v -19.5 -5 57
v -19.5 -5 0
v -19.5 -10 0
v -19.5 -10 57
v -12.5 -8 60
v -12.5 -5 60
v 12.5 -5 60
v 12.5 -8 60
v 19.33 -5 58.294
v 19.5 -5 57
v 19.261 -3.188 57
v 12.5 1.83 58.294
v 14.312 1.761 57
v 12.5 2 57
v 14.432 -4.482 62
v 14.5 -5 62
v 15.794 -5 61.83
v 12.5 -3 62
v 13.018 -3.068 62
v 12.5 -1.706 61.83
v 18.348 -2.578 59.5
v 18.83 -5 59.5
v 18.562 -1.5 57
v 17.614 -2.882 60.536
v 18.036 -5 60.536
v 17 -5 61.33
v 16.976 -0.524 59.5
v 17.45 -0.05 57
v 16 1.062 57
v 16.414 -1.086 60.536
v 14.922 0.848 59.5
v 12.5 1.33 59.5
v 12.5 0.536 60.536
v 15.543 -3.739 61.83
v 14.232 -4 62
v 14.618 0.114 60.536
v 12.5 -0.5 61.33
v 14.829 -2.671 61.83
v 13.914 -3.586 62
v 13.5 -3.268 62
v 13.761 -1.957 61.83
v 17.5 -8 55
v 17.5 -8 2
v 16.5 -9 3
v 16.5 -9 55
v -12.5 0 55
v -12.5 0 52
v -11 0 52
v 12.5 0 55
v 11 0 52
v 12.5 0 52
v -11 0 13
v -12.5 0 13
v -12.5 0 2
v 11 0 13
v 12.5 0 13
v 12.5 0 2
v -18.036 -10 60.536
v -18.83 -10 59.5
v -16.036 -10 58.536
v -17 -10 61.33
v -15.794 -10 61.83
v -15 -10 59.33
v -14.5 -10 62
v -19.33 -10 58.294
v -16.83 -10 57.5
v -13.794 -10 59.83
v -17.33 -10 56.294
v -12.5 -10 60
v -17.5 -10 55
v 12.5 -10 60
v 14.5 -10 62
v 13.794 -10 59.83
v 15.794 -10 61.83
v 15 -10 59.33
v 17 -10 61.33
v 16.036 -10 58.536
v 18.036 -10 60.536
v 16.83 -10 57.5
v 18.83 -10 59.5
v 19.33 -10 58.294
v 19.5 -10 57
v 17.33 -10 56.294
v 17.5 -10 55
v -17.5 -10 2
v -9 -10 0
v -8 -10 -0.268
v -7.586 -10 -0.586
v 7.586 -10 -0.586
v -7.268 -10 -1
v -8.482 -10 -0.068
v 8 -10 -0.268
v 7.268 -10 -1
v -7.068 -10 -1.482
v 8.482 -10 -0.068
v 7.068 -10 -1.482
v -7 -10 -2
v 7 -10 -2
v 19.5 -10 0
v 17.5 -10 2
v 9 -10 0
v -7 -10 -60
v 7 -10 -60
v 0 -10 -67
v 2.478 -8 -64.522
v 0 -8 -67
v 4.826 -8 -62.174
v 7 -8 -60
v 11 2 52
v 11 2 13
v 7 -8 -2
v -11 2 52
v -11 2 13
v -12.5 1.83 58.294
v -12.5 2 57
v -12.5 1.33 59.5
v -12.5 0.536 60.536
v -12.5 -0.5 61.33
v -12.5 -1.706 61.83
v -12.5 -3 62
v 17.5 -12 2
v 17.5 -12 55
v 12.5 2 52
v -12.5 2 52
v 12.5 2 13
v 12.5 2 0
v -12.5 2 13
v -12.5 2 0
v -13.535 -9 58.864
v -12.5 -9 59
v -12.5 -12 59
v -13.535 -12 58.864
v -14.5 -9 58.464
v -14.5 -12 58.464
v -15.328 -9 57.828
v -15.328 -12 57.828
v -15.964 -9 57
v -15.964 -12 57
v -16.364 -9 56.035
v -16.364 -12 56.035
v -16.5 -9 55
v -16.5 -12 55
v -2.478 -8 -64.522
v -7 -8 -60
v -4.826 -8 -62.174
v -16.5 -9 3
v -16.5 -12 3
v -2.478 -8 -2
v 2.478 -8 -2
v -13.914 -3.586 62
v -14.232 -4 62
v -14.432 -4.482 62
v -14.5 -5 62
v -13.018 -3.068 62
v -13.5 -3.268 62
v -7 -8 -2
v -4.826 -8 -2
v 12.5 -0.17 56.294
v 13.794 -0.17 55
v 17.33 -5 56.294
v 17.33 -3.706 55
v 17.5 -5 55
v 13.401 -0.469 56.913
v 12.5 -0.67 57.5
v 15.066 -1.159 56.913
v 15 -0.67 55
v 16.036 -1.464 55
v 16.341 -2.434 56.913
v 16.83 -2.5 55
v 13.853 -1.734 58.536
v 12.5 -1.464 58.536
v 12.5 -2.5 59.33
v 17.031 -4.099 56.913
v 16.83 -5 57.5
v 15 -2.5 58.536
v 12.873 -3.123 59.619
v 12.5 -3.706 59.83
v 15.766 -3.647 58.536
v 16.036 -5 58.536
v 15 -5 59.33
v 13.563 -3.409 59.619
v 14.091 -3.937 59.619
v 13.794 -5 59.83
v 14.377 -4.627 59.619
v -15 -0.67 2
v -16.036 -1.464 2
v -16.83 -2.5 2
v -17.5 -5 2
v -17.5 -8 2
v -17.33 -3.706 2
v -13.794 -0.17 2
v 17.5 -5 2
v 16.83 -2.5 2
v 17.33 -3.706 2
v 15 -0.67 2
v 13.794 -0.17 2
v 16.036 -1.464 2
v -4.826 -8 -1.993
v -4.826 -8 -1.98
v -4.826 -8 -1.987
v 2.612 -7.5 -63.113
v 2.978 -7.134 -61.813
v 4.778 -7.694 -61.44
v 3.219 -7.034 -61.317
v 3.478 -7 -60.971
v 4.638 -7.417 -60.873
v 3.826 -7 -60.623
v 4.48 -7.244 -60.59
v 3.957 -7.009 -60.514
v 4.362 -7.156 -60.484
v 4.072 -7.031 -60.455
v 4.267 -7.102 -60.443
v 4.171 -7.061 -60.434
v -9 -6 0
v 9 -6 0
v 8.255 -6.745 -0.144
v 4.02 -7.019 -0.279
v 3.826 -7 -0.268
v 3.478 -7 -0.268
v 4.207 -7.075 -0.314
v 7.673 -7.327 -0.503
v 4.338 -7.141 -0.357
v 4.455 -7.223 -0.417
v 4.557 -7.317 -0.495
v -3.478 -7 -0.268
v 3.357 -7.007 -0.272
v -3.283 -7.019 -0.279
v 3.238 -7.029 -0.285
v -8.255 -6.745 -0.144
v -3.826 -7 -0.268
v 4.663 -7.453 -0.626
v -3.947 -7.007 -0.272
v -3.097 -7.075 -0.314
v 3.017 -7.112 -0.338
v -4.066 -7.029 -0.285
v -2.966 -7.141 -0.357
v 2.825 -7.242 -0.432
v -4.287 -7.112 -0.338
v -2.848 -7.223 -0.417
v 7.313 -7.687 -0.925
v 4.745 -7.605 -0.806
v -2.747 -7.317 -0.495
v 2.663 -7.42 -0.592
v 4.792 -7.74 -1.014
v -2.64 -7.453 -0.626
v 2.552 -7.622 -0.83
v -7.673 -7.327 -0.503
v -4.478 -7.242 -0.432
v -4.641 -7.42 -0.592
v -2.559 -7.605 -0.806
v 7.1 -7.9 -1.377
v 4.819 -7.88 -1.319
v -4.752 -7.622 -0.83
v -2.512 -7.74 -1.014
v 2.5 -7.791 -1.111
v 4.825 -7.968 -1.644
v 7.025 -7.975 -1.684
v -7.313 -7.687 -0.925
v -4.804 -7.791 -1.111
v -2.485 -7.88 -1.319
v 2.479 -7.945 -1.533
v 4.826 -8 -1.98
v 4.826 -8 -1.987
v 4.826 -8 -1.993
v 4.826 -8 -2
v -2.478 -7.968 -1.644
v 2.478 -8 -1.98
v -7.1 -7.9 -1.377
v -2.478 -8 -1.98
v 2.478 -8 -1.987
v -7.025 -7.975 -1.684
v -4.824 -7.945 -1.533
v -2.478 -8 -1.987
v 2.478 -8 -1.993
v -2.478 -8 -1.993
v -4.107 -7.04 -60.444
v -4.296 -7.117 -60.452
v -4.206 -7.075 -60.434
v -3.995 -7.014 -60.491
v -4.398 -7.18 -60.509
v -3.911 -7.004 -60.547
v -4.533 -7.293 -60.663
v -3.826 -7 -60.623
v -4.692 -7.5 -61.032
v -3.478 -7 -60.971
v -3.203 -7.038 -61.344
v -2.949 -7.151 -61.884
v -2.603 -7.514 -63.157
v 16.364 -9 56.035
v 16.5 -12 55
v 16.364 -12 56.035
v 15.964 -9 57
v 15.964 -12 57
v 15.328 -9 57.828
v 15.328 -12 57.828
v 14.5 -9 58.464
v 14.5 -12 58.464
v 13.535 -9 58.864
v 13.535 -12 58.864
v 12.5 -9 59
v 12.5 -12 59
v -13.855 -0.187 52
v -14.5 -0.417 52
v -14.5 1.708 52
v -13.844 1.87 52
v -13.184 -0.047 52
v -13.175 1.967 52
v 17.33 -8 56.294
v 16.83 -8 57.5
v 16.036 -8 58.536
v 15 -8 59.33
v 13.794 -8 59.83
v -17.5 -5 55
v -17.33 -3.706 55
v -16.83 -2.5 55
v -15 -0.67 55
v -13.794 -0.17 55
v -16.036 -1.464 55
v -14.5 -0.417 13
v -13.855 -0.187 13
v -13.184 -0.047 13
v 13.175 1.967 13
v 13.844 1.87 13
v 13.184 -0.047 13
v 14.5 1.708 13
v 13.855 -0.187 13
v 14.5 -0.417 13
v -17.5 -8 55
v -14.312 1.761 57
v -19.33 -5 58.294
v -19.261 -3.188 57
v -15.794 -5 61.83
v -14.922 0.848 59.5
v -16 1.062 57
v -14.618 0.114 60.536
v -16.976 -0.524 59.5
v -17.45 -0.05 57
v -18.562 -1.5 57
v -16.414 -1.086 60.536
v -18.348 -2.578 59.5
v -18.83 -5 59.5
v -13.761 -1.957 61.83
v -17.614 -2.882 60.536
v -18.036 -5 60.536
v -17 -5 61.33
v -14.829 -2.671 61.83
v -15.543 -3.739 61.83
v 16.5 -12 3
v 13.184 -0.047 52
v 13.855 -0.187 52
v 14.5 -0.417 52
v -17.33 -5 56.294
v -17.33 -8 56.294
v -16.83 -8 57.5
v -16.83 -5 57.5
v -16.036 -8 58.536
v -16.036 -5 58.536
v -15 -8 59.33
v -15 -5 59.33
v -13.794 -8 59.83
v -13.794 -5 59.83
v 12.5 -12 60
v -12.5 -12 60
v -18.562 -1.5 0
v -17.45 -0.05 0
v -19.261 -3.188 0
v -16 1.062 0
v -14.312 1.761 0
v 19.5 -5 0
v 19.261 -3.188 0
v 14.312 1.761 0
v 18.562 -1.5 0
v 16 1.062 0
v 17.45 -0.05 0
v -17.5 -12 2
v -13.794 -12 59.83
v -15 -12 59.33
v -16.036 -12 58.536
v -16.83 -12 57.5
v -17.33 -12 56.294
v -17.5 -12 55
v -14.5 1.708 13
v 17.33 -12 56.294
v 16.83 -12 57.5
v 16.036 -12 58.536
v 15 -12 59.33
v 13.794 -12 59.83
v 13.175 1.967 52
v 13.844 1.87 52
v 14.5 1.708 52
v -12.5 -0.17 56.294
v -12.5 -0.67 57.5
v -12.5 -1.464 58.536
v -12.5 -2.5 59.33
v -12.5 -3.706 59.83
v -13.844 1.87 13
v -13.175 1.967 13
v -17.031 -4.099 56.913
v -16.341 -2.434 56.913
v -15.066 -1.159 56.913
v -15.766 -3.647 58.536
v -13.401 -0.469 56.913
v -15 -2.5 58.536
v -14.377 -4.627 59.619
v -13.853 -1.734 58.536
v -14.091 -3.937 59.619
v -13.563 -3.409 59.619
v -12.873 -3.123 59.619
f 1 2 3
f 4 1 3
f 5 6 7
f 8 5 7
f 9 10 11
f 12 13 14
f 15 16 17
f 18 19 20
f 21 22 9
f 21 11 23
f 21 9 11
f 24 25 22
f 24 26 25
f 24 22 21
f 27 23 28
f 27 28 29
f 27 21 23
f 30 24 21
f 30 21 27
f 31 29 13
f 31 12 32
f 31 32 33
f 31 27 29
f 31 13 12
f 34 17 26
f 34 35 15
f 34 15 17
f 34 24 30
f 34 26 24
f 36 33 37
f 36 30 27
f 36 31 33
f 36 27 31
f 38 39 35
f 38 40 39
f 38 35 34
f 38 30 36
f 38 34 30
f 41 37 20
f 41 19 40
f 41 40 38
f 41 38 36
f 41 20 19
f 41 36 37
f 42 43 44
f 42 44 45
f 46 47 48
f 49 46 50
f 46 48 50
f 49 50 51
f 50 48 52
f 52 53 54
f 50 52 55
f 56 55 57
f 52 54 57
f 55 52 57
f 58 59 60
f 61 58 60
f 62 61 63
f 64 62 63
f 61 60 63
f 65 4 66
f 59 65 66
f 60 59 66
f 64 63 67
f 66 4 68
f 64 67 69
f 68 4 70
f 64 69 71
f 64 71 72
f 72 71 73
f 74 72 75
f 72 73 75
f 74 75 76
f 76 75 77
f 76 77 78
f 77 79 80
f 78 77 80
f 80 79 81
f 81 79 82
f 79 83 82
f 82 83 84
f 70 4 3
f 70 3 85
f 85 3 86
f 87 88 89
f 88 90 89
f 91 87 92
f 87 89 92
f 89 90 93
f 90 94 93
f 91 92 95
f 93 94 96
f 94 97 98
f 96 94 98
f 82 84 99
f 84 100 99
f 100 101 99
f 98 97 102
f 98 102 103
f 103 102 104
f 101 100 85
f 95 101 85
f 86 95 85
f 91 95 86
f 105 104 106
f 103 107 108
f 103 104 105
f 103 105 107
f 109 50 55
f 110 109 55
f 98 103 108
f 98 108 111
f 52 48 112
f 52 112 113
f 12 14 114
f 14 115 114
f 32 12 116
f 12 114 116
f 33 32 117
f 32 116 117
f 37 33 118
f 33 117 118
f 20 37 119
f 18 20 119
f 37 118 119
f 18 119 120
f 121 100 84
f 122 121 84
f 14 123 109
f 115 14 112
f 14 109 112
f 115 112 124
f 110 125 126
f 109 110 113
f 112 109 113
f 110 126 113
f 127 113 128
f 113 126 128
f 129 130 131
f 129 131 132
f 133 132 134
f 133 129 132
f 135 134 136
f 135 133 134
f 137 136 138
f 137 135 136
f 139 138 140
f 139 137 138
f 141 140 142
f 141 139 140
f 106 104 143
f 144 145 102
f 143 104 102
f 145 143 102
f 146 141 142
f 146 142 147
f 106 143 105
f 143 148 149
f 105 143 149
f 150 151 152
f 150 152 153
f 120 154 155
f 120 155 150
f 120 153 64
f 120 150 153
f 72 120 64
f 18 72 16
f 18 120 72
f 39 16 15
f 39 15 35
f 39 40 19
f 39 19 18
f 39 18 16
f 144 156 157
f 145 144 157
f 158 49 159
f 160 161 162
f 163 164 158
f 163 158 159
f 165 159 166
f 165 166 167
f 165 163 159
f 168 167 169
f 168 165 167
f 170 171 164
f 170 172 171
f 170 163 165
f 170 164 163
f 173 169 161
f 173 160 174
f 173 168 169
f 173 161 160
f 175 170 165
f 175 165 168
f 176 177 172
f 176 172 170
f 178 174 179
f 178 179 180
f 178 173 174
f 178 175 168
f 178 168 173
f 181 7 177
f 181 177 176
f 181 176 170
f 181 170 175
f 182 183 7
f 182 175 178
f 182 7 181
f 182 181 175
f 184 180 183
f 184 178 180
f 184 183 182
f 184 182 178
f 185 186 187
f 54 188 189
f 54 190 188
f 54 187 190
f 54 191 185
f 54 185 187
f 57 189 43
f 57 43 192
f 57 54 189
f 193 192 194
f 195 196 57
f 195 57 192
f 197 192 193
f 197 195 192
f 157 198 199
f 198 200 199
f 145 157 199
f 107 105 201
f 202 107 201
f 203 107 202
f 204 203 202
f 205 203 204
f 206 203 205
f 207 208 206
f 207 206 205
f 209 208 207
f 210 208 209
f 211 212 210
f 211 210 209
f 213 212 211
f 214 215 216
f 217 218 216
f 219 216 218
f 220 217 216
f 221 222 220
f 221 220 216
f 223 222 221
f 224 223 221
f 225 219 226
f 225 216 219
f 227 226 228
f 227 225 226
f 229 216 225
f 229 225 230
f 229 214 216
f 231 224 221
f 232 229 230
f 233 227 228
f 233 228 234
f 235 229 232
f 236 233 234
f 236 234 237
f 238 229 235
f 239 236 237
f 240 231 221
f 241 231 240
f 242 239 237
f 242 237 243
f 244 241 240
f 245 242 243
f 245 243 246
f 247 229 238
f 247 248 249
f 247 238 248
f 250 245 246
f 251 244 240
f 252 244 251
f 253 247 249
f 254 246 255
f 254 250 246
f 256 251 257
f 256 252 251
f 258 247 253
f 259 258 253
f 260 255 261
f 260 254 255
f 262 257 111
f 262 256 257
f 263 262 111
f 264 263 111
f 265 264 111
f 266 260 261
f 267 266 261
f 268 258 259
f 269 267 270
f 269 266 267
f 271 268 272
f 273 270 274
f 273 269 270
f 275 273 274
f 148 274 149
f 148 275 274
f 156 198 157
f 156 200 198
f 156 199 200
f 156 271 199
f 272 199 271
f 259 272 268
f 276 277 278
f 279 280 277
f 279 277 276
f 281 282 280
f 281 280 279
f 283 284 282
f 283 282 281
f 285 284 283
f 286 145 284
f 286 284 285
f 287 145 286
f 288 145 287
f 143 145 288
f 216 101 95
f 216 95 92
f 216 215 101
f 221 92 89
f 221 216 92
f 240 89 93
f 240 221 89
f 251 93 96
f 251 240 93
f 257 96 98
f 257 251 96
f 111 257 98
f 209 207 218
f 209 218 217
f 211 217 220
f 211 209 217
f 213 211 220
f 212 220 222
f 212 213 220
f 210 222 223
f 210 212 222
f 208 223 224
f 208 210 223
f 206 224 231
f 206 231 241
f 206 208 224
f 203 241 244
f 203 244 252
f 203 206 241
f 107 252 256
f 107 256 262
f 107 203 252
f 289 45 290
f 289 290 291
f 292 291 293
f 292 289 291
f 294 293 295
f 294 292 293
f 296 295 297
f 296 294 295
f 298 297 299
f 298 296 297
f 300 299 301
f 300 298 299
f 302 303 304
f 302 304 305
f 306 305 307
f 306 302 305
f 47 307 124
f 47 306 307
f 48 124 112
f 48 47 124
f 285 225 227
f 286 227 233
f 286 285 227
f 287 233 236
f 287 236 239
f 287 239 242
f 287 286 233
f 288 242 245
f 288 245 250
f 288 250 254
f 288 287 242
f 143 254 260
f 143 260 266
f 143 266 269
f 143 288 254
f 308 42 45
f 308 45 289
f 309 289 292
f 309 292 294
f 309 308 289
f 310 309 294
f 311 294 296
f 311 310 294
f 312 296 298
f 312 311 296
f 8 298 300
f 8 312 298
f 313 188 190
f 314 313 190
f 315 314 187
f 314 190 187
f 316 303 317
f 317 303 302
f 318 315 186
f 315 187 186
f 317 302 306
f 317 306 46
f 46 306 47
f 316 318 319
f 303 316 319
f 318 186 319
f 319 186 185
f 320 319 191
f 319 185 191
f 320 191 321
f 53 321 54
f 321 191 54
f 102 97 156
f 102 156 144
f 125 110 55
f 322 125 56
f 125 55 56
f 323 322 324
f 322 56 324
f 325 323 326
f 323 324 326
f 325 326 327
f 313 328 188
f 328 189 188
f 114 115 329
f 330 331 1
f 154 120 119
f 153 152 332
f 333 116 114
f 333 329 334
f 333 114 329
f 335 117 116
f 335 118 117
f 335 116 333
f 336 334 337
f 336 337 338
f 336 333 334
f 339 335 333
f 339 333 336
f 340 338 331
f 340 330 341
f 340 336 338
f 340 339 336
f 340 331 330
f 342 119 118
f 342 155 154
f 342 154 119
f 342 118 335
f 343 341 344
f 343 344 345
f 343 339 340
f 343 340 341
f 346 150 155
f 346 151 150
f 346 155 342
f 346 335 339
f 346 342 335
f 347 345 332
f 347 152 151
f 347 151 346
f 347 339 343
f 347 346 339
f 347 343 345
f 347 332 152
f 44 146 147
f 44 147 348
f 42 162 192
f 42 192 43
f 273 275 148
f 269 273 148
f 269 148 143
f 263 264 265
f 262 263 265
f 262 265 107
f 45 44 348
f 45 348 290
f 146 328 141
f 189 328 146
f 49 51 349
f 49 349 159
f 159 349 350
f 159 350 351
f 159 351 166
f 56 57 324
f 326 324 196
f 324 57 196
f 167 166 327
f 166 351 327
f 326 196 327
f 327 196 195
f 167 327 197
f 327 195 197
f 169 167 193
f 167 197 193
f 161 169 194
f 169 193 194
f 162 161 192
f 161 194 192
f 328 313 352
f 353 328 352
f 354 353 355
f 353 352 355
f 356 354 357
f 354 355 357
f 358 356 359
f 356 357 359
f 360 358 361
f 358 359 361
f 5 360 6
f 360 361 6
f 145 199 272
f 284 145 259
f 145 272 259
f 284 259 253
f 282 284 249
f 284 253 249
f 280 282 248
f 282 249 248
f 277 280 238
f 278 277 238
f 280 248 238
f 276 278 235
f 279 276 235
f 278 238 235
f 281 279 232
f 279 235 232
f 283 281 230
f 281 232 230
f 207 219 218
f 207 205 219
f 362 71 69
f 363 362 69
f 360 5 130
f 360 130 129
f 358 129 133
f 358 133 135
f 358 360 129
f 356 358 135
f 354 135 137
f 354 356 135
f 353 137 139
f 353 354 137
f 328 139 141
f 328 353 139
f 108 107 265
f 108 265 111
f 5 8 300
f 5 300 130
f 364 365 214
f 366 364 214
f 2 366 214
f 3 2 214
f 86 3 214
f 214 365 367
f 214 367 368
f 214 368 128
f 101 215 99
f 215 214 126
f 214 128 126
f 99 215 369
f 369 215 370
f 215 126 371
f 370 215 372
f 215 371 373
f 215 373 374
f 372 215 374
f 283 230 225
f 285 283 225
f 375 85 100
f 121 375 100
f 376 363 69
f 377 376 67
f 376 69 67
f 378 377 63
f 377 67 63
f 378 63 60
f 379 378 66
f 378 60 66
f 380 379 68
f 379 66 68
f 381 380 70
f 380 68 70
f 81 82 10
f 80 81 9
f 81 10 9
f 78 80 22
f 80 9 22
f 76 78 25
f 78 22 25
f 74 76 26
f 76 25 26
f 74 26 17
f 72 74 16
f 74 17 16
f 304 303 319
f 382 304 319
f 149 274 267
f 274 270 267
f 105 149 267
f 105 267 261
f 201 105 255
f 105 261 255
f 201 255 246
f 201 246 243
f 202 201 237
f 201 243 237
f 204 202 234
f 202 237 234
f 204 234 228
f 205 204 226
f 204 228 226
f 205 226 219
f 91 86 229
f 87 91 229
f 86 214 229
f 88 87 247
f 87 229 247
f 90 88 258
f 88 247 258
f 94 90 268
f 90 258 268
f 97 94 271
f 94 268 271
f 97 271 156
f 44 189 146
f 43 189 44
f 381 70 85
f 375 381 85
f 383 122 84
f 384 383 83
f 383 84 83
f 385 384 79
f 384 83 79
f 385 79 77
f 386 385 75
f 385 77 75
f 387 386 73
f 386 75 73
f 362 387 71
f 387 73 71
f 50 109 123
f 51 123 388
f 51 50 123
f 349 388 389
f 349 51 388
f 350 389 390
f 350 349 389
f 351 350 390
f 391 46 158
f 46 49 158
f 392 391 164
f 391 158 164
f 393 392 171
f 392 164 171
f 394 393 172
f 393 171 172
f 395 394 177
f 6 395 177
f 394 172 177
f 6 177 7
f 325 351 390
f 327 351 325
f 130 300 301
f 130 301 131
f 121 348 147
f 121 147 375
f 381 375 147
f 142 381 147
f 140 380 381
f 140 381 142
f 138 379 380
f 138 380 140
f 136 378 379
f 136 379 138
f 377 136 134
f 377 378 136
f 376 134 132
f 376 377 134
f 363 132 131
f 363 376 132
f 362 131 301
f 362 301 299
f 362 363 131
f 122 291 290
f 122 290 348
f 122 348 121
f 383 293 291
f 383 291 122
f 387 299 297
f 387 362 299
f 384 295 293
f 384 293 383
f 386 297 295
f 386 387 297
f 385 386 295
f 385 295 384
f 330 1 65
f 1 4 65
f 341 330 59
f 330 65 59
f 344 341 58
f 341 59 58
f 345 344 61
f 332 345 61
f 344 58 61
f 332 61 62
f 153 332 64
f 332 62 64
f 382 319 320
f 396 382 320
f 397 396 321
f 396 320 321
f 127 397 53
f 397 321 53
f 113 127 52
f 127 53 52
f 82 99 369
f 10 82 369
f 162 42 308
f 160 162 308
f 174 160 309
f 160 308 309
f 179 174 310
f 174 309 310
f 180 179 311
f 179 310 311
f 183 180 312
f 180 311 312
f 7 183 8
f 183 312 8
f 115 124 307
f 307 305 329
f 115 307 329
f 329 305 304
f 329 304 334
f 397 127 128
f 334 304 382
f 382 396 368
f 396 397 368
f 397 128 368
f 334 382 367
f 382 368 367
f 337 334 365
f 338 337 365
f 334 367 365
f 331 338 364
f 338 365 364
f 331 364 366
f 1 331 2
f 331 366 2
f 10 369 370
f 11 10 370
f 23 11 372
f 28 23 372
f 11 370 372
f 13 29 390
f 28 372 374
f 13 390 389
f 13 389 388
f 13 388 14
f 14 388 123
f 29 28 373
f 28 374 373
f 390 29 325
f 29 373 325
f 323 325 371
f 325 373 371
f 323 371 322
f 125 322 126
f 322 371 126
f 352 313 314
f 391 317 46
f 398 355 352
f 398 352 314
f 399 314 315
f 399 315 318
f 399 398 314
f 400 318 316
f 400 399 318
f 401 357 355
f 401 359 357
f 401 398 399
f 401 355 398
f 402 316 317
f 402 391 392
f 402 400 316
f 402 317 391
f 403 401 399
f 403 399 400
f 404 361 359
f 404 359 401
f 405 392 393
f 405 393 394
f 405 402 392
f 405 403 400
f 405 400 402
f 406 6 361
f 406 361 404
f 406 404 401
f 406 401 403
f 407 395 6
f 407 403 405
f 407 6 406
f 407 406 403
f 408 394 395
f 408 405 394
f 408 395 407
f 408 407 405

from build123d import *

# Parameters (mm, degrees)
BOSS_EXTRUDE1_DEPTH      = 60
BOSS_EXTRUDE2_DEPTH      = 2
BOSS_EXTRUDE3_START      = 60
BOSS_EXTRUDE3_DEPTH      = 2
FILLET1_R                = 5
BOSS_EXTRUDE4_DEPTH      = 2
FILLET2_R                = 2
BOSS_EXTRUDE5_DEPTH      = 2
BOSS_EXTRUDE5_DEPTH_BACK = 1
CHAMFER3_SIZE            = 1
BOSS_EXTRUDE6_DEPTH      = 1
FILLET3_R                = 1
CHAMFER4_SIZE            = 1
CHAMFER4_SIZE_2          = 1.804047755
CUT_EXTRUDE1_DEPTH       = 72.17056976
CUT_EXTRUDE1_DEPTH_BACK  = 72.17056976
SKETCH6_W                = 3.5
SKETCH6_H                = 39


# Some blends are built 0.0001 mm under size
with BuildPart() as part:
    # Sketch1 → Boss-Extrude1 (new body)
    with BuildSketch(Plane.XY):
        with BuildLine():
            Line((-12.5, 0), (12.5, 0))
            ThreePointArc((12.5, 0), (16.035533906, -1.464466094), (17.5, -5))
            Line((17.5, -5), (17.5, -10))
            Line((17.5, -10), (19.5, -10))
            Line((19.5, -10), (19.5, -5))
            ThreePointArc((19.5, -5), (17.449747468, -0.050252532), (12.5, 2))
            Line((12.5, 2), (-12.5, 2))
            ThreePointArc((-12.5, 2), (-17.449747468, -0.050252532), (-19.5, -5))
            Line((-19.5, -5), (-19.5, -10))
            Line((-19.5, -10), (-17.5, -10))
            Line((-17.5, -10), (-17.5, -5))
            ThreePointArc((-17.5, -5), (-16.035533906, -1.464466094), (-12.5, 0))
        make_face()
    extrude(amount=BOSS_EXTRUDE1_DEPTH)

    # Sketch2 → Boss-Extrude2 (add)
    with BuildSketch(Plane.XY):
        with BuildLine():
            Line((19.5, -10), (19.5, -5))
            ThreePointArc((19.5, -5), (17.449747468, -0.050252532), (12.5, 2))
            Line((12.5, 2), (-12.5, 2))
            ThreePointArc((-12.5, 2), (-17.449747468, -0.050252532), (-19.5, -5))
            Line((-19.5, -5), (-19.5, -10))
            Line((-19.5, -10), (19.5, -10))
        make_face()
    extrude(amount=BOSS_EXTRUDE2_DEPTH)

    # Sketch2<2> → Boss-Extrude3 (add)
    with BuildSketch(Plane.XY.offset(BOSS_EXTRUDE3_START)):
        with BuildLine():
            Line((19.5, -10), (19.5, -5))
            ThreePointArc((19.5, -5), (17.449747468, -0.050252532), (12.5, 2))
            Line((12.5, 2), (-12.5, 2))
            ThreePointArc((-12.5, 2), (-17.449747468, -0.050252532), (-19.5, -5))
            Line((-19.5, -5), (-19.5, -10))
            Line((-19.5, -10), (19.5, -10))
        make_face()
    extrude(amount=BOSS_EXTRUDE3_DEPTH)

    # Fillet1
    fillet1_edges = [part.edges().sort_by_distance(p)[0] for p in [
        (-17.5, -7.5, 60),
        (-16.035533906, -1.464466094, 60),
        (0, 0, 60),
        (16.035533906, -1.464466094, 60),
        (-17.449747468, -0.050252532, 62),
        (17.449747468, -0.050252532, 62),
        (-19.5, -7.5, 62),
        (19.5, -7.5, 62),
        (0, 2, 62),
        (17.5, -7.5, 60),
    ]]
    fillet(fillet1_edges, radius=FILLET1_R)

    # Sketch3 → Boss-Extrude4 (add)
    with BuildSketch(Plane.XZ.offset(10)):
        Polygon((-7, 0), (-7, -60), (0, -67), (7, -60), (7, 0), align=None)
    extrude(amount=-BOSS_EXTRUDE4_DEPTH)

    # Fillet2
    fillet2_edges = [part.edges().sort_by_distance(p)[0] for p in [
        (0, -8, 0),
        (-7, -9, 0),
        (7, -9, 0),
    ]]
    fillet(fillet2_edges, radius=FILLET2_R)

    # Sketch4 → Boss-Extrude5 (add, two sides: drawn at the far end of the back side and taken through both)
    with BuildSketch(Plane.XZ.offset(10).offset(-BOSS_EXTRUDE5_DEPTH_BACK)):
        with BuildLine():
            Line((-17.5, 2), (17.5, 2))
            Line((17.5, 2), (17.5, 55))
            ThreePointArc((17.5, 55), (16.035533906, 58.535533906), (12.5, 60))
            Line((12.5, 60), (-12.5, 60))
            ThreePointArc((-12.5, 60), (-16.035533906, 58.535533906), (-17.5, 55))
            Line((-17.5, 55), (-17.5, 2))
        make_face()
        with BuildLine():
            Line((-16.5, 3), (16.5, 3))
            Line((16.5, 3), (16.5, 55))
            ThreePointArc((16.5, 55), (15.328427125, 57.828427125), (12.5, 59))
            Line((12.5, 59), (-12.5, 59))
            ThreePointArc((-12.5, 59), (-15.328427125, 57.828427125), (-16.5, 55))
            Line((-16.5, 55), (-16.5, 3))
        make_face(mode=Mode.SUBTRACT)
    extrude(amount=BOSS_EXTRUDE5_DEPTH + BOSS_EXTRUDE5_DEPTH_BACK)

    # Chamfer3
    chamfer3_edges = [part.edges().sort_by_distance(p)[0] for p in [
        (-17.5, -9, 28.5),
        (-16.035533906, -9, 58.535533906),
        (0, -9, 60),
        (16.035533906, -9, 58.535533906),
        (17.5, -9, 28.5),
        (0, -9, 2),
    ]]
    chamfer(chamfer3_edges, length=CHAMFER3_SIZE - 0.0001)  # a hair under: the kernel refuses the full size

    # Sketch5 → Boss-Extrude6 (add)
    with BuildSketch(Plane(origin=(0, -8, 0), x_dir=(1, 0, 0), z_dir=(0, 1, 0))):
        Polygon((-4.825973992, 0), (-2.477626604, 0), (-2.477626604, 64.522373396), (-4.825973992, 62.174026008), align=None)
        Polygon((4.825973992, 0), (4.825973992, 62.174026008), (2.477626604, 64.522373396), (2.477626604, 0), align=None)
    extrude(amount=BOSS_EXTRUDE6_DEPTH)

    # Fillet3
    fillet3_edges = [part.edges().sort_by_distance(p)[0] for p in [
        (4.825973992, -7, -31.2209876),
        (2.477626604, -7, -32.395161294),
        (-2.477626604, -7, -32.395161294),
        (-4.825973992, -7, -31.2209876),
    ]]
    fillet(fillet3_edges, radius=FILLET3_R - 0.0001)  # a hair under: the kernel refuses the full size

    # Chamfer4
    # the kernel refuses this chamfer: 1.804047755, 1 mm, written as the material it takes off along each edge
    with BuildSketch(Plane(origin=(-0.176240013, -7, -66.823759987), x_dir=(-0.04304000526140607, -0.9981458389905735, -0.043040005261406056), z_dir=(-0.7071067811865475, 0, 0.7071067811865477)), Plane(origin=(7.127360583, -7, -59.872639417), x_dir=(0.043040005261406056, -0.9981458389905735, -0.04304000526140604), z_dir=(-0.7071067811865475, 0, -0.7071067811865477))) as chamfer4_piece_1:
        Polygon((CHAMFER4_SIZE * 0.998145838991, CHAMFER4_SIZE * 0.0608677591653), (-CHAMFER4_SIZE_2 * 0.0608677591744, CHAMFER4_SIZE_2 * 0.998145839141), (0, 0), align=None)
    extrude(amount=9.830368984, mode=Mode.SUBTRACT)

    # Sketch6 → Cut-Extrude1 (cut, two sides: drawn at the far end of the back side and taken through both)
    with BuildSketch(Plane(origin=(0, 2, 0), x_dir=(1, 0, 0), z_dir=(0, 1, 0)).offset(-CUT_EXTRUDE1_DEPTH_BACK)):
        with Locations((12.75, -32.5)):
            Rectangle(SKETCH6_W, SKETCH6_H)
        with Locations((-12.75, -32.5)):
            Rectangle(SKETCH6_W, SKETCH6_H)
    extrude(amount=CUT_EXTRUDE1_DEPTH + CUT_EXTRUDE1_DEPTH_BACK, mode=Mode.SUBTRACT)


solid = part.part
